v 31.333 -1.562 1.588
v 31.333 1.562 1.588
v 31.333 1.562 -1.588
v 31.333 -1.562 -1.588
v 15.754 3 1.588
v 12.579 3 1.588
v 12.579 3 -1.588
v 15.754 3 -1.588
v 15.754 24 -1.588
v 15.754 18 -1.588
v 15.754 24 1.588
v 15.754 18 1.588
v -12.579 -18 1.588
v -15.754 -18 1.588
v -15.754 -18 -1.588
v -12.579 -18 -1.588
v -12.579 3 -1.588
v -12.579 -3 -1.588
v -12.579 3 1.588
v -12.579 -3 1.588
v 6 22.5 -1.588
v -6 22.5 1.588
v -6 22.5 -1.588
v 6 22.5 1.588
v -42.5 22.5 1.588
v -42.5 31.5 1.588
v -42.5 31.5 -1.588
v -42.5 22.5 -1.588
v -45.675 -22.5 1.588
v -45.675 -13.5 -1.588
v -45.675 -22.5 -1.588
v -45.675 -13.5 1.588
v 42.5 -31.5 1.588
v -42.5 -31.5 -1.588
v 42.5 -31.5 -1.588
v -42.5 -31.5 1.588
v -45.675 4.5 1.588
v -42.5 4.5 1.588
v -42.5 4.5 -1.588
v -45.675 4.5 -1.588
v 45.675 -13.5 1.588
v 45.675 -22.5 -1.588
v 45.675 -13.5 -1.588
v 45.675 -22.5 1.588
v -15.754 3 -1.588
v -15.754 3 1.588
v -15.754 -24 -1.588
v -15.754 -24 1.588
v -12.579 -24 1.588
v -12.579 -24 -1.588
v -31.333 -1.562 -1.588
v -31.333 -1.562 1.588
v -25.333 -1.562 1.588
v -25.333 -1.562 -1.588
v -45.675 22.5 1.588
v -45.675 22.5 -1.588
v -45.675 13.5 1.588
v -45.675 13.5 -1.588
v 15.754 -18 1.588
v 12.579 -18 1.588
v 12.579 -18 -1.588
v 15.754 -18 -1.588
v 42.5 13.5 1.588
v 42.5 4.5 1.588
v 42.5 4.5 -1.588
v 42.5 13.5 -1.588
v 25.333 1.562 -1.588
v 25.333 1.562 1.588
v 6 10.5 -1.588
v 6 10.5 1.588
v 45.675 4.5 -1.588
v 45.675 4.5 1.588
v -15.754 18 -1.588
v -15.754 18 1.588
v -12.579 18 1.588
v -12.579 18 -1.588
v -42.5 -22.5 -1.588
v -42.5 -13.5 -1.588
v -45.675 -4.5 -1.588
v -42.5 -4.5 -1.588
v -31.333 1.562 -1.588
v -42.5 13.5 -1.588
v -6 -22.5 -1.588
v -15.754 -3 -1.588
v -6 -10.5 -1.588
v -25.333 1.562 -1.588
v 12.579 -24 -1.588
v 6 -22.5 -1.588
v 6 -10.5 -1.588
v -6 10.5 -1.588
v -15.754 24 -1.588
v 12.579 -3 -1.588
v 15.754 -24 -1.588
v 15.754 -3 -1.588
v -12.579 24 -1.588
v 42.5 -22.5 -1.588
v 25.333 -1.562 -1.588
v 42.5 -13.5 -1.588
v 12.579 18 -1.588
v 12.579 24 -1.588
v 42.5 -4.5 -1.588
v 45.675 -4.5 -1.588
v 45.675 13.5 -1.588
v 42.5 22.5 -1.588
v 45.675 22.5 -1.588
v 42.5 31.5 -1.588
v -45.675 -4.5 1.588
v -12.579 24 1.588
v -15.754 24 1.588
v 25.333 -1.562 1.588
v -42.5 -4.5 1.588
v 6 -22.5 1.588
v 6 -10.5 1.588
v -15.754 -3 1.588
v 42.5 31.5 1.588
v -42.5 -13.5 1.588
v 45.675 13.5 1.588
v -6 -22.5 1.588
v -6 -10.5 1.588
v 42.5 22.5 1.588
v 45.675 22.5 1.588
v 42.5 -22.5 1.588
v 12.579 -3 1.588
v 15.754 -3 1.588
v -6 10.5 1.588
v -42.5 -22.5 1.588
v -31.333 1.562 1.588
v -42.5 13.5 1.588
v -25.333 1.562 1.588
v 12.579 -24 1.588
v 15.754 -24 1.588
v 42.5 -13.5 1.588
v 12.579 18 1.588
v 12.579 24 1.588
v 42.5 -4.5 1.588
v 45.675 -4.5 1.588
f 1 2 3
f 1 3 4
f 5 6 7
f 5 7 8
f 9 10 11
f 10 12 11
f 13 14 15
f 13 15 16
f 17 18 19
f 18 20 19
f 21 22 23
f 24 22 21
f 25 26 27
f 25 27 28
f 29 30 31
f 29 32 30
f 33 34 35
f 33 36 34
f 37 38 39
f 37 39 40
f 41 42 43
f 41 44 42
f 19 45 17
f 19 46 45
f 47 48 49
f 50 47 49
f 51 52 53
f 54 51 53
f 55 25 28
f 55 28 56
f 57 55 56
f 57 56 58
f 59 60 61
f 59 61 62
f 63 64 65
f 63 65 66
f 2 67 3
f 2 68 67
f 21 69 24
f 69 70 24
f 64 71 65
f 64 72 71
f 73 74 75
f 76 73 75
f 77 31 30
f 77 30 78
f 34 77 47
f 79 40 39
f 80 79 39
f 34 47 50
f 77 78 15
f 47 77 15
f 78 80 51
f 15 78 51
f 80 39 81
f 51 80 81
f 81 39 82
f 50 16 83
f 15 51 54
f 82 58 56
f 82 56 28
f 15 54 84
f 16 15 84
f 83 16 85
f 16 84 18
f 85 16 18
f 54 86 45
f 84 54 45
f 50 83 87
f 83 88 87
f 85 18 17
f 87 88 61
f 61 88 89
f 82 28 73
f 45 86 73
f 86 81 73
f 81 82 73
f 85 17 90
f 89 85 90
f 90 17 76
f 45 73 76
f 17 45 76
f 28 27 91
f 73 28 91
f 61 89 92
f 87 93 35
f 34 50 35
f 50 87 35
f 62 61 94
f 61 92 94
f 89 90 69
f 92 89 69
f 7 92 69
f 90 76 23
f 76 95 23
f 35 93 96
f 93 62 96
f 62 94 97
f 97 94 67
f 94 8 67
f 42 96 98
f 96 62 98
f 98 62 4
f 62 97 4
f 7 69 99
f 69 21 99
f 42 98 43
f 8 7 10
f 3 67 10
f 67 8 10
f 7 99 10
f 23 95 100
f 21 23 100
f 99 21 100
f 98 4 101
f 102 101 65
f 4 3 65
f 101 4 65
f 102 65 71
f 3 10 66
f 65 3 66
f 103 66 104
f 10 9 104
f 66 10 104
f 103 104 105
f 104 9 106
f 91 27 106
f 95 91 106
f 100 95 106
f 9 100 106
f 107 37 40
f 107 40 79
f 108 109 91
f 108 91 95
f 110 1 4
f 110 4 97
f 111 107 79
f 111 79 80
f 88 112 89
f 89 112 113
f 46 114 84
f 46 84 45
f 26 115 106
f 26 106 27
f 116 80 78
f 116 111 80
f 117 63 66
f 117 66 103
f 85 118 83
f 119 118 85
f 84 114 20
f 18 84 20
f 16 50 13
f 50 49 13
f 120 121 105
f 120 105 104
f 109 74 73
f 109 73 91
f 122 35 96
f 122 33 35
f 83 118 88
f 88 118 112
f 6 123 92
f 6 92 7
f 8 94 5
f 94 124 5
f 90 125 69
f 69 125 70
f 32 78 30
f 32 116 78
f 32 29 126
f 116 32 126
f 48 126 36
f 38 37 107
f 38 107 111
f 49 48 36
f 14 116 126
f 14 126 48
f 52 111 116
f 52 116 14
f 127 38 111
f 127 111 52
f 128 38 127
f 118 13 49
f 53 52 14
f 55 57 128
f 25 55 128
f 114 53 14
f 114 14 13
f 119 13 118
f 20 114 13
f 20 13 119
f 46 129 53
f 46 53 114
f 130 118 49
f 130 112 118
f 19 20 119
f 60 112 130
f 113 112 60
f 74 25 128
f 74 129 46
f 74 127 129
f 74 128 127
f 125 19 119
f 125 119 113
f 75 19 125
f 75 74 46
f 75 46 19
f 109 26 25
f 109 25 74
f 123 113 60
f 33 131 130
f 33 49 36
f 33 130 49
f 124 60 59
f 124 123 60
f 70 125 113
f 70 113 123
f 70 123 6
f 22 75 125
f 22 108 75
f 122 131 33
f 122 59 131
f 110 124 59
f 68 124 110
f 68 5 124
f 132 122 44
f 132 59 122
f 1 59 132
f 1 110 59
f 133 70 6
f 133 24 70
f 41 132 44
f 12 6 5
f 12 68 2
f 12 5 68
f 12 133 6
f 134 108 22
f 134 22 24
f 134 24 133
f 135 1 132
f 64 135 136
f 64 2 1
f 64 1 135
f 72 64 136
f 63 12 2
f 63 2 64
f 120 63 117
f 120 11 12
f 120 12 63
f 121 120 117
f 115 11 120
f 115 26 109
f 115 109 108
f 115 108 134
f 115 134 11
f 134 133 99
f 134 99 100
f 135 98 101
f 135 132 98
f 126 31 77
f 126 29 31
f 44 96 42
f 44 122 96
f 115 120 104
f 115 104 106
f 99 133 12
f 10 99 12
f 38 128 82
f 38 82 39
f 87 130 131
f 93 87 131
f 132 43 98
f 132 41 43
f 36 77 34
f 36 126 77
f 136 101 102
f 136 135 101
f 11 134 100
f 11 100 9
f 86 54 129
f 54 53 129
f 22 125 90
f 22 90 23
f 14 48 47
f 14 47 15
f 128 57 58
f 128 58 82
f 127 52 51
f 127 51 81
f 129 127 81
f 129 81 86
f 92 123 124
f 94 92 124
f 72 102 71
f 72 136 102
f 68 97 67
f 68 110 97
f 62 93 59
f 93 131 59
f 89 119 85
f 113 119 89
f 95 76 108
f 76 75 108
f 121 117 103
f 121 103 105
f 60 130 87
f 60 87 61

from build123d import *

# Parameters (mm, degrees)
SKETCH1_W           = 12
SKETCH1_H           = 12
SKETCH1_W_2         = 3.175
SKETCH1_H_2         = 6
SKETCH1_W_3         = 6
SKETCH1_H_3         = 3.125
BOSS_EXTRUDE1_DEPTH = 1.5875


with BuildPart() as part:
    # Sketch1 → Boss-Extrude1 (new, symmetric)
    with BuildSketch(Plane.XY):
        Polygon((45.675, 0), (45.675, 4.5), (42.5, 4.5), (42.5, 13.5), (45.675, 13.5), (45.675, 22.5), (42.5, 22.5), (42.5, 31.5), (-42.5, 31.5), (-42.5, 22.5), (-45.675, 22.5), (-45.675, 13.5), (-42.5, 13.5), (-42.5, 4.5), (-45.675, 4.5), (-45.675, -4.5), (-42.5, -4.5), (-42.5, -13.5), (-45.675, -13.5), (-45.675, -22.5), (-42.5, -22.5), (-42.5, -31.5), (42.5, -31.5), (42.5, -22.5), (45.675, -22.5), (45.675, -13.5), (42.5, -13.5), (42.5, -4.5), (45.675, -4.5), align=None)
        with Locations((0, -16.5)):
            Rectangle(SKETCH1_W, SKETCH1_H, mode=Mode.SUBTRACT)
        with Locations((0, 16.5)):
            Rectangle(SKETCH1_W, SKETCH1_H, mode=Mode.SUBTRACT)
        with Locations((14.166666667, -21)):
            Rectangle(SKETCH1_W_2, SKETCH1_H_2, mode=Mode.SUBTRACT)
        with Locations((14.166666667, 0)):
            Rectangle(SKETCH1_W_2, SKETCH1_H_2, mode=Mode.SUBTRACT)
        Polygon((31.333333333, 1.5625), (31.333333333, 0), (31.333333333, -1.5625), (25.333333333, -1.5625), (25.333333333, 1.5625), align=None, mode=Mode.SUBTRACT)
        with Locations((14.166666667, 21)):
            Rectangle(SKETCH1_W_2, SKETCH1_H_2, mode=Mode.SUBTRACT)
        with Locations((-14.166666667, 21)):
            Rectangle(SKETCH1_W_2, SKETCH1_H_2, mode=Mode.SUBTRACT)
        with Locations((-14.166666667, -21)):
            Rectangle(SKETCH1_W_2, SKETCH1_H_2, mode=Mode.SUBTRACT)
        with Locations((-28.333333333, 0)):
            Rectangle(SKETCH1_W_3, SKETCH1_H_3, mode=Mode.SUBTRACT)
        with Locations((-14.166666667, 0)):
            Rectangle(SKETCH1_W_2, SKETCH1_H_2, mode=Mode.SUBTRACT)
    extrude(amount=BOSS_EXTRUDE1_DEPTH, both=True)


solid = part.part
